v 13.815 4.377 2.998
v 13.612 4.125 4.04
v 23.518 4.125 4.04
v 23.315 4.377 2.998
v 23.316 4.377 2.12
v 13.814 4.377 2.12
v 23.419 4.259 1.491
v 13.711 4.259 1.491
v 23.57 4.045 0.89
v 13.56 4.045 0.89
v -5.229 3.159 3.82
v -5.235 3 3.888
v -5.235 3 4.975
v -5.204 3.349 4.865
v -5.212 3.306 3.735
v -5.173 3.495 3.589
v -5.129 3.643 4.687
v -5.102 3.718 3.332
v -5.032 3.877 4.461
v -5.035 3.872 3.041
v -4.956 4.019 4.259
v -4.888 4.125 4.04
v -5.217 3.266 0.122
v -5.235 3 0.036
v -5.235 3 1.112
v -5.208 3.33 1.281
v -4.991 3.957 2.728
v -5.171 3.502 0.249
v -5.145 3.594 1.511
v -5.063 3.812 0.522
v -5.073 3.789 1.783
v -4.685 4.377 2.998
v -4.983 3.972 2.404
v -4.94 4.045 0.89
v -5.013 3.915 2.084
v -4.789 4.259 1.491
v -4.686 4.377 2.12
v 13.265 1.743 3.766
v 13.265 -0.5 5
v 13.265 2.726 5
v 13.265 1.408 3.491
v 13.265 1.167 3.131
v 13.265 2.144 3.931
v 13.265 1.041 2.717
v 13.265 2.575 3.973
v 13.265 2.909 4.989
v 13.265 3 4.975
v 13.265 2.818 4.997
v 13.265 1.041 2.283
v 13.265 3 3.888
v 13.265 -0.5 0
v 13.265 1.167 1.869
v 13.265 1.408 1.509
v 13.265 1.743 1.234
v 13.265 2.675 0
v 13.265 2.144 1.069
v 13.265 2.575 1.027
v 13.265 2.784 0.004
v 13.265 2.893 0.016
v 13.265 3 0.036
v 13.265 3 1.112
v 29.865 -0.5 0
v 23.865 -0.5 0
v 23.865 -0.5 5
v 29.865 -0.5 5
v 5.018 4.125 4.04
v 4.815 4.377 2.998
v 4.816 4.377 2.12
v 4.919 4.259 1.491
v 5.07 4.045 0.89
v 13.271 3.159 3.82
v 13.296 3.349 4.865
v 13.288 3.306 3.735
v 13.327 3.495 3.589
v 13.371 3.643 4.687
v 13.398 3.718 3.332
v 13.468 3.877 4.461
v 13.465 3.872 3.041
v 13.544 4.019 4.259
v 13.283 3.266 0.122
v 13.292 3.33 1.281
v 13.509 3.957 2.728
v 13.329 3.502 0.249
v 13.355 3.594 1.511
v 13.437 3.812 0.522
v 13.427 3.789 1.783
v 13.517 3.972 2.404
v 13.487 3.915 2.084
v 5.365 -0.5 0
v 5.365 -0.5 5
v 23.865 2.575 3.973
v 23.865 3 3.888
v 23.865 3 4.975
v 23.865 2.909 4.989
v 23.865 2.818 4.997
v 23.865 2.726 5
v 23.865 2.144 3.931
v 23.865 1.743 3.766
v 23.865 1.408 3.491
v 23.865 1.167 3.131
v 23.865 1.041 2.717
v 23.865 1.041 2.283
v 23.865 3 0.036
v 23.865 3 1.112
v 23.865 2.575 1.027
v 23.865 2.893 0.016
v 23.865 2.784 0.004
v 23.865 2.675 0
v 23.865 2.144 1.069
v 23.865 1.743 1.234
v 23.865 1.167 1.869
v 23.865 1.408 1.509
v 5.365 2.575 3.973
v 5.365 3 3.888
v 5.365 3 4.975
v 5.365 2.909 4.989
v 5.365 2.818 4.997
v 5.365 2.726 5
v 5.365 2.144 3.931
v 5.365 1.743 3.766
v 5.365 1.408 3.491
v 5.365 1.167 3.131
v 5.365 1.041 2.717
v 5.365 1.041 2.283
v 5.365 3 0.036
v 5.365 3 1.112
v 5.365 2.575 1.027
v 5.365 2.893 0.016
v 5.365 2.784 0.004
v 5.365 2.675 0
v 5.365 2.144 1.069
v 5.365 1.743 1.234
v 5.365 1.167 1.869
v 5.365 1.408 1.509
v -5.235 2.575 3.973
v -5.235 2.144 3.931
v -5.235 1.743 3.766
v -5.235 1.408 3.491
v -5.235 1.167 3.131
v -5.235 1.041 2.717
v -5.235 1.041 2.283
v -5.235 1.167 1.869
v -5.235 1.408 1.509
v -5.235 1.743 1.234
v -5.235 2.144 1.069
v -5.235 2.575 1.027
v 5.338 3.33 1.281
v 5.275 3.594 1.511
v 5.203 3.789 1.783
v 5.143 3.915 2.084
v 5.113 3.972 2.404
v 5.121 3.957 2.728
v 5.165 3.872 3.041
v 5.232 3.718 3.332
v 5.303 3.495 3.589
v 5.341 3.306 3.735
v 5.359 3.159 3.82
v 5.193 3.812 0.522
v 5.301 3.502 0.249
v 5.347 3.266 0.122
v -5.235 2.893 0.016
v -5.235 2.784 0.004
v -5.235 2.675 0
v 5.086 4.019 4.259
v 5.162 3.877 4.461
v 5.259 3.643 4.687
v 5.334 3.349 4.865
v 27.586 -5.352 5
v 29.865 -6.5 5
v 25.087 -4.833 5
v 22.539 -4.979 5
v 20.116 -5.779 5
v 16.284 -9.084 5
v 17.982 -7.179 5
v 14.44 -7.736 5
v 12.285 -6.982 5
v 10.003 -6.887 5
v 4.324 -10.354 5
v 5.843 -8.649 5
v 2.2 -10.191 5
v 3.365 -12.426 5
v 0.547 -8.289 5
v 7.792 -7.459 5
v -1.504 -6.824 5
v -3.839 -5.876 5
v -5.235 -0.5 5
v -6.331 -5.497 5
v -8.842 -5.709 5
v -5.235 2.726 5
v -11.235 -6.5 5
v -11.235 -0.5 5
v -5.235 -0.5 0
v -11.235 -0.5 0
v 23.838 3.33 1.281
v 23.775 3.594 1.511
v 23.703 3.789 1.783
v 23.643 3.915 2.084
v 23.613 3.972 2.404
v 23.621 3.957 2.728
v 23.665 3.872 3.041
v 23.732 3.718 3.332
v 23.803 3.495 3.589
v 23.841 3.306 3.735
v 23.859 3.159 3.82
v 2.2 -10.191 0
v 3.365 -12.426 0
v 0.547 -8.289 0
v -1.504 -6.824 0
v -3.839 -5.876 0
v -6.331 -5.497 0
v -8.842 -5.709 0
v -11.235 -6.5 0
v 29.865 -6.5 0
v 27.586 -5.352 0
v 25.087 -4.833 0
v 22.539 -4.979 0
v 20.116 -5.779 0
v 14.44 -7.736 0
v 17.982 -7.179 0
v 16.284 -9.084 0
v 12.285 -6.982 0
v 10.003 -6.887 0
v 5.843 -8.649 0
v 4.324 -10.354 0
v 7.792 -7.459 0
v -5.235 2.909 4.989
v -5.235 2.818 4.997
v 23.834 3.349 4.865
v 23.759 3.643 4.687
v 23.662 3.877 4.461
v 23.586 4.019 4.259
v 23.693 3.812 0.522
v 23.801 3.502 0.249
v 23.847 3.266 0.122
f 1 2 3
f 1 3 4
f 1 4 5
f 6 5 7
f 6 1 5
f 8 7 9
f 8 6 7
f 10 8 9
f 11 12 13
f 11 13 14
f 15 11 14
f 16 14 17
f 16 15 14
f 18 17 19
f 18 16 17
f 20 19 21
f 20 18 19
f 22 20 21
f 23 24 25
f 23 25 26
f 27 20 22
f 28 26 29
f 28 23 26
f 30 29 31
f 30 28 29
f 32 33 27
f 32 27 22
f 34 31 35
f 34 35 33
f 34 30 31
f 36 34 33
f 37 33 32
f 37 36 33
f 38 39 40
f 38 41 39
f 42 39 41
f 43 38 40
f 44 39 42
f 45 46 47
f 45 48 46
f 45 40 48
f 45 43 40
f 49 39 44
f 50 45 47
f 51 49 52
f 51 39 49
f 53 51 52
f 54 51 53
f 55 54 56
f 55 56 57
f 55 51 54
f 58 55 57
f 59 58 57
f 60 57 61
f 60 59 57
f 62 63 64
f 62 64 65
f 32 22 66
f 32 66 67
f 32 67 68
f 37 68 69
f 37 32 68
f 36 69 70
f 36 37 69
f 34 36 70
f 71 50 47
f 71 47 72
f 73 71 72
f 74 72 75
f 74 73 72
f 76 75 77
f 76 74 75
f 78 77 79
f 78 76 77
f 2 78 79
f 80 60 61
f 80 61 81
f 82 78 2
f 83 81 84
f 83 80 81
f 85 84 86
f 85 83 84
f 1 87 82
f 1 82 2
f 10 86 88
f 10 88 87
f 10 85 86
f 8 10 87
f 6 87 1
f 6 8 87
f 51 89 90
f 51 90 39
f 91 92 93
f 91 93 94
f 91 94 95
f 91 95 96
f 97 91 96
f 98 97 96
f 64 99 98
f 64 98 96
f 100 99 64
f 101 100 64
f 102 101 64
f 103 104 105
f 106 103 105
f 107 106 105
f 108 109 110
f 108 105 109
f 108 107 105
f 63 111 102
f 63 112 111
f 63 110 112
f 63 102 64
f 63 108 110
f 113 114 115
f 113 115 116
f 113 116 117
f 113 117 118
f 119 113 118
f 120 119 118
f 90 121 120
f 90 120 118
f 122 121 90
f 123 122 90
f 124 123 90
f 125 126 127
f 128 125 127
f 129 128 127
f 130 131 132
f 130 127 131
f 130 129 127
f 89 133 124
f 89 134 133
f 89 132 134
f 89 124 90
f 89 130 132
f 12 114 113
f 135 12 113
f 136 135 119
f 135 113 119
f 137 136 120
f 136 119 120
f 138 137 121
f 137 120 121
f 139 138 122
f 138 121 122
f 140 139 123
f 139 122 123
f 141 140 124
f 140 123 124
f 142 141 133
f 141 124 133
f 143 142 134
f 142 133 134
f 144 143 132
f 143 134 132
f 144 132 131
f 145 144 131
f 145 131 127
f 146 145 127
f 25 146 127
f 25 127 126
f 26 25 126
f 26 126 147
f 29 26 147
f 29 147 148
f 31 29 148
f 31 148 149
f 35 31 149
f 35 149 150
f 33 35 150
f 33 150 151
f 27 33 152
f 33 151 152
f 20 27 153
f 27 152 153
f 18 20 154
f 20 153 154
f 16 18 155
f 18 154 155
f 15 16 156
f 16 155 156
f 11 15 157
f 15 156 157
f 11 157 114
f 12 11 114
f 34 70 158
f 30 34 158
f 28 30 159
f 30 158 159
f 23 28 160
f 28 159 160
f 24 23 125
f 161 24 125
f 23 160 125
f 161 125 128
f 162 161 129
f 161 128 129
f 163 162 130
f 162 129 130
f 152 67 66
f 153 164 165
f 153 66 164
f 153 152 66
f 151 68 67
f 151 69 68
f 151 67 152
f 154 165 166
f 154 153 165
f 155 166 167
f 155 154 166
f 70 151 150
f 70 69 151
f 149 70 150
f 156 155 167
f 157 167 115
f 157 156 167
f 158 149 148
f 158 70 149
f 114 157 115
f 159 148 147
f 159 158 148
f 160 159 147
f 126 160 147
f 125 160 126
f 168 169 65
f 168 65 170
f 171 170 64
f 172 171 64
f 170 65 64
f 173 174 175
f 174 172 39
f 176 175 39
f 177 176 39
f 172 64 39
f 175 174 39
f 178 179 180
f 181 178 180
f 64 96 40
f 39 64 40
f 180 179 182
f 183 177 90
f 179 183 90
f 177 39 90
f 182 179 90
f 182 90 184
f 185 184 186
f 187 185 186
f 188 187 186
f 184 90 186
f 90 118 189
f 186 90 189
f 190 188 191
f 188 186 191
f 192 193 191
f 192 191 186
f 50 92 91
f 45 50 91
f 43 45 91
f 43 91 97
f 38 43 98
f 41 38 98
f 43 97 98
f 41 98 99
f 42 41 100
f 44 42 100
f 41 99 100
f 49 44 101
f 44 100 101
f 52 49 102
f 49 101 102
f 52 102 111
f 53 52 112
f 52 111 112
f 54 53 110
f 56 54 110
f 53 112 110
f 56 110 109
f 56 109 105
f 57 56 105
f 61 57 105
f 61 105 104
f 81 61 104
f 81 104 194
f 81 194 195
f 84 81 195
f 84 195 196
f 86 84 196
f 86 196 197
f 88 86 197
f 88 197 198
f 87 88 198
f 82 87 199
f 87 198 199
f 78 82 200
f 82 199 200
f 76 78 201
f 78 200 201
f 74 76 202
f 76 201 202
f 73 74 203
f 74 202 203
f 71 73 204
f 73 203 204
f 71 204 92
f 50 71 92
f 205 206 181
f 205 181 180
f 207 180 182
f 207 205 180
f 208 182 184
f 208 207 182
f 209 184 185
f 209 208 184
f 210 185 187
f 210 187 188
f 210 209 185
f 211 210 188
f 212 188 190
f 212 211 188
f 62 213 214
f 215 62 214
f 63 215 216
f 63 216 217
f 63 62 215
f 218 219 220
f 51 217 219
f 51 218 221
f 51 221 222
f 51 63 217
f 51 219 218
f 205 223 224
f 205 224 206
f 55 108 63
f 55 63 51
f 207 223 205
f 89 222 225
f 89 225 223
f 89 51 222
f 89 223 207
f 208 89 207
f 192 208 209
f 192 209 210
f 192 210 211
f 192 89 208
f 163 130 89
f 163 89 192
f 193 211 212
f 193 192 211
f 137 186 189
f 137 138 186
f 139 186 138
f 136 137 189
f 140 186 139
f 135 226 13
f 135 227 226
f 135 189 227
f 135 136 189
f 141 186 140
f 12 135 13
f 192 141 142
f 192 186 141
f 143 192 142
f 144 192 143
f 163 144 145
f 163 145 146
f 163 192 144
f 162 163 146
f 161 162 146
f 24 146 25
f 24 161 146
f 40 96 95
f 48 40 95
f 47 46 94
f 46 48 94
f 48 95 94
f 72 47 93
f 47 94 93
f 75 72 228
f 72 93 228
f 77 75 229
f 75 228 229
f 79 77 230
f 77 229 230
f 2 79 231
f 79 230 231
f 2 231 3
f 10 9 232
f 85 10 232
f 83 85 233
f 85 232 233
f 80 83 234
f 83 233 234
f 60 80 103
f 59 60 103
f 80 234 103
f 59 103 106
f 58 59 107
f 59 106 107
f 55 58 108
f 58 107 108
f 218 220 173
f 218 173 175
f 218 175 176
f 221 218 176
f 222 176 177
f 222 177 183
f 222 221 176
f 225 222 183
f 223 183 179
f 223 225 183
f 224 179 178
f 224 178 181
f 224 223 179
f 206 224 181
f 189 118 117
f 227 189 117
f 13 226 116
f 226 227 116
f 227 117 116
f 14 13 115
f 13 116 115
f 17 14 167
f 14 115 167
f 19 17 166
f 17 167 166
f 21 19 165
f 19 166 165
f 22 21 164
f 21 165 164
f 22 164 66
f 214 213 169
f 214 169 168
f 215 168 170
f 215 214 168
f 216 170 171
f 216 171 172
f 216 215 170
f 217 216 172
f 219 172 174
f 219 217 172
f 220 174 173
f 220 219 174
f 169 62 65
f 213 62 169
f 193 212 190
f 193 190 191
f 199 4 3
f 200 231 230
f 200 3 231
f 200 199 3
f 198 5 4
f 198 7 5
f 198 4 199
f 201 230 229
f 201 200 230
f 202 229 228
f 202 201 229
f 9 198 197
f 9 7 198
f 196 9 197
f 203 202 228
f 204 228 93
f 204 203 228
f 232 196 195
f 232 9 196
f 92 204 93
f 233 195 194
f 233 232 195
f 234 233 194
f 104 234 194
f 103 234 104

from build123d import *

# Parameters (mm, degrees)
SALIENTE_EXTRUIR1_DEPTH    = 5
CROQUIS5_R                 = 1.475
CORTAR_EXTRUIR3_DEPTH      = 10.6
CROQUIS10_R                = 1.475
CORTAR_EXTRUIR5_DEPTH      = 28.922395492
CORTAR_EXTRUIR6_DEPTH      = 38.568872355
CORTAR_EXTRUIR6_DEPTH_BACK = 38.568872355
REDONDEO5_R                = 1.5


with BuildPart() as part:
    # Croquis1 → Saliente-Extruir1 (new body)
    with BuildSketch(Plane.XY):
        with BuildLine():
            Line((-11.235063244, -0.5), (-5.235063244, -0.5))
            Line((-5.235063244, -0.5), (-5.235063244, 3))
            ThreePointArc((-5.235063244, 3), (-4.649276807, 4.414213562), (-3.235063244, 5))
            Line((-3.235063244, 5), (3.364936756, 5))
            ThreePointArc((3.364936756, 5), (4.779150318, 4.414213562), (5.364936756, 3))
            Line((5.364936756, 3), (5.364936756, -0.5))
            Line((5.364936756, -0.5), (13.264936756, -0.5))
            Line((13.264936756, -0.5), (13.264936756, 3))
            ThreePointArc((13.264936756, 3), (13.850723193, 4.414213562), (15.264936756, 5))
            Line((15.264936756, 5), (21.864936756, 5))
            ThreePointArc((21.864936756, 5), (23.279150318, 4.414213562), (23.864936756, 3))
            Line((23.864936756, 3), (23.864936756, -0.5))
            Line((23.864936756, -0.5), (29.864936756, -0.5))
            Line((29.864936756, -0.5), (29.864936756, -6.5))
            ThreePointArc((29.864936756, -6.5), (22.539313598, -4.979099508), (16.283876735, -9.083658268))
            ThreePointArc((16.283876735, -9.083658268), (8.876557279, -7.091468541), (3.364936756, -12.426188836))
            ThreePointArc((3.364936756, -12.426188836), (-2.643411058, -6.280927524), (-11.235063244, -6.5))
            Line((-11.235063244, -6.5), (-11.235063244, -0.5))
        make_face()
    extrude(amount=SALIENTE_EXTRUIR1_DEPTH)

    # Croquis5 → Cortar-Extruir3 (cut)
    with BuildSketch(Plane(origin=(23.864936756, 0, 0), x_dir=(0, 0, -1), z_dir=(1, 0, 0))):
        with Locations(Location((-2.5, 2.5, 0), (0, 0, 160.185071851))):
            Circle(CROQUIS5_R)
    extrude(amount=-CORTAR_EXTRUIR3_DEPTH, mode=Mode.SUBTRACT)

    # Croquis10 → Cortar-Extruir5 (cut, through all)
    with BuildSketch(Plane(origin=(5.364936756, 0, 0), x_dir=(0, 0, -1), z_dir=(1, 0, 0))):
        with Locations(Location((-2.5, 2.5, 0), (0, 0, 160.185071851))):
            Circle(CROQUIS10_R)
    extrude(amount=-CORTAR_EXTRUIR5_DEPTH, mode=Mode.SUBTRACT)

    # Croquis12 → Cortar-Extruir6 (cut, two sides: drawn at the far end of the back side and taken through both)
    with BuildSketch(Plane(origin=(23.864936756, 0, 0), x_dir=(0, 0, -1), z_dir=(1, 0, 0)).offset(-CORTAR_EXTRUIR6_DEPTH_BACK)):
        with BuildLine():
            Line((-35.945468922, -27.281986612), (-5.466117705, 3.197364605))
            ThreePointArc((-5.466117705, 3.197364605), (-2.561384811, 4.400544365), (0.343348083, 3.197364605))
            Line((0.343348083, 3.197364605), (30.8226993, -27.281986612))
            Line((30.8226993, -27.281986612), (30.8226993, 58.926637114))
            Line((30.8226993, 58.926637114), (-35.945468922, 58.926637114))
            Line((-35.945468922, 58.926637114), (-35.945468922, -27.281986612))
        make_face()
    extrude(amount=CORTAR_EXTRUIR6_DEPTH + CORTAR_EXTRUIR6_DEPTH_BACK, mode=Mode.SUBTRACT)

    # Redondeo5
    # the kernel refuses this fillet: 1.5 mm, written as the material it takes off along each edge
    with BuildSketch(Plane(origin=(7.90277719, 3.504212976, 0), x_dir=(0, -1, 0), z_dir=(-1, 0, 0)), Plane(origin=(26.40277719, 3.504212976, 0), x_dir=(0, -1, 0), z_dir=(-1, 0, 0))) as redondeo5_piece_1:
        with BuildLine():
            CenterArc((0.829424534, 1.5), REDONDEO5_R, 204.015661093, 65.984338907)
            ThreePointArc((-0.540726837, 0.889520499), (-0.298653835, 0.427562908), (0, 0))
            Line((0, 0), (0.829424534, 0))
        make_face()
    extrude(amount=15.675680868, mode=Mode.SUBTRACT)
    with BuildSketch(Plane(origin=(8.011290884, 3.59839975, 5), x_dir=(0, -1, 0), z_dir=(-1, 0, 0)), Plane(origin=(26.511290884, 3.59839975, 5), x_dir=(0, -1, 0), z_dir=(-1, 0, 0))) as redondeo5_piece_2:
        with BuildLine():
            CenterArc((0.872619886, -1.5), REDONDEO5_R, 90, 68.905299391)
            ThreePointArc((-0.526860355, -0.960134226), (-0.295570649, -0.462430475), (0, 0))
            Line((0, 0), (0.872619886, 0))
        make_face()
    extrude(amount=15.892708257, mode=Mode.SUBTRACT)


solid = part.part
